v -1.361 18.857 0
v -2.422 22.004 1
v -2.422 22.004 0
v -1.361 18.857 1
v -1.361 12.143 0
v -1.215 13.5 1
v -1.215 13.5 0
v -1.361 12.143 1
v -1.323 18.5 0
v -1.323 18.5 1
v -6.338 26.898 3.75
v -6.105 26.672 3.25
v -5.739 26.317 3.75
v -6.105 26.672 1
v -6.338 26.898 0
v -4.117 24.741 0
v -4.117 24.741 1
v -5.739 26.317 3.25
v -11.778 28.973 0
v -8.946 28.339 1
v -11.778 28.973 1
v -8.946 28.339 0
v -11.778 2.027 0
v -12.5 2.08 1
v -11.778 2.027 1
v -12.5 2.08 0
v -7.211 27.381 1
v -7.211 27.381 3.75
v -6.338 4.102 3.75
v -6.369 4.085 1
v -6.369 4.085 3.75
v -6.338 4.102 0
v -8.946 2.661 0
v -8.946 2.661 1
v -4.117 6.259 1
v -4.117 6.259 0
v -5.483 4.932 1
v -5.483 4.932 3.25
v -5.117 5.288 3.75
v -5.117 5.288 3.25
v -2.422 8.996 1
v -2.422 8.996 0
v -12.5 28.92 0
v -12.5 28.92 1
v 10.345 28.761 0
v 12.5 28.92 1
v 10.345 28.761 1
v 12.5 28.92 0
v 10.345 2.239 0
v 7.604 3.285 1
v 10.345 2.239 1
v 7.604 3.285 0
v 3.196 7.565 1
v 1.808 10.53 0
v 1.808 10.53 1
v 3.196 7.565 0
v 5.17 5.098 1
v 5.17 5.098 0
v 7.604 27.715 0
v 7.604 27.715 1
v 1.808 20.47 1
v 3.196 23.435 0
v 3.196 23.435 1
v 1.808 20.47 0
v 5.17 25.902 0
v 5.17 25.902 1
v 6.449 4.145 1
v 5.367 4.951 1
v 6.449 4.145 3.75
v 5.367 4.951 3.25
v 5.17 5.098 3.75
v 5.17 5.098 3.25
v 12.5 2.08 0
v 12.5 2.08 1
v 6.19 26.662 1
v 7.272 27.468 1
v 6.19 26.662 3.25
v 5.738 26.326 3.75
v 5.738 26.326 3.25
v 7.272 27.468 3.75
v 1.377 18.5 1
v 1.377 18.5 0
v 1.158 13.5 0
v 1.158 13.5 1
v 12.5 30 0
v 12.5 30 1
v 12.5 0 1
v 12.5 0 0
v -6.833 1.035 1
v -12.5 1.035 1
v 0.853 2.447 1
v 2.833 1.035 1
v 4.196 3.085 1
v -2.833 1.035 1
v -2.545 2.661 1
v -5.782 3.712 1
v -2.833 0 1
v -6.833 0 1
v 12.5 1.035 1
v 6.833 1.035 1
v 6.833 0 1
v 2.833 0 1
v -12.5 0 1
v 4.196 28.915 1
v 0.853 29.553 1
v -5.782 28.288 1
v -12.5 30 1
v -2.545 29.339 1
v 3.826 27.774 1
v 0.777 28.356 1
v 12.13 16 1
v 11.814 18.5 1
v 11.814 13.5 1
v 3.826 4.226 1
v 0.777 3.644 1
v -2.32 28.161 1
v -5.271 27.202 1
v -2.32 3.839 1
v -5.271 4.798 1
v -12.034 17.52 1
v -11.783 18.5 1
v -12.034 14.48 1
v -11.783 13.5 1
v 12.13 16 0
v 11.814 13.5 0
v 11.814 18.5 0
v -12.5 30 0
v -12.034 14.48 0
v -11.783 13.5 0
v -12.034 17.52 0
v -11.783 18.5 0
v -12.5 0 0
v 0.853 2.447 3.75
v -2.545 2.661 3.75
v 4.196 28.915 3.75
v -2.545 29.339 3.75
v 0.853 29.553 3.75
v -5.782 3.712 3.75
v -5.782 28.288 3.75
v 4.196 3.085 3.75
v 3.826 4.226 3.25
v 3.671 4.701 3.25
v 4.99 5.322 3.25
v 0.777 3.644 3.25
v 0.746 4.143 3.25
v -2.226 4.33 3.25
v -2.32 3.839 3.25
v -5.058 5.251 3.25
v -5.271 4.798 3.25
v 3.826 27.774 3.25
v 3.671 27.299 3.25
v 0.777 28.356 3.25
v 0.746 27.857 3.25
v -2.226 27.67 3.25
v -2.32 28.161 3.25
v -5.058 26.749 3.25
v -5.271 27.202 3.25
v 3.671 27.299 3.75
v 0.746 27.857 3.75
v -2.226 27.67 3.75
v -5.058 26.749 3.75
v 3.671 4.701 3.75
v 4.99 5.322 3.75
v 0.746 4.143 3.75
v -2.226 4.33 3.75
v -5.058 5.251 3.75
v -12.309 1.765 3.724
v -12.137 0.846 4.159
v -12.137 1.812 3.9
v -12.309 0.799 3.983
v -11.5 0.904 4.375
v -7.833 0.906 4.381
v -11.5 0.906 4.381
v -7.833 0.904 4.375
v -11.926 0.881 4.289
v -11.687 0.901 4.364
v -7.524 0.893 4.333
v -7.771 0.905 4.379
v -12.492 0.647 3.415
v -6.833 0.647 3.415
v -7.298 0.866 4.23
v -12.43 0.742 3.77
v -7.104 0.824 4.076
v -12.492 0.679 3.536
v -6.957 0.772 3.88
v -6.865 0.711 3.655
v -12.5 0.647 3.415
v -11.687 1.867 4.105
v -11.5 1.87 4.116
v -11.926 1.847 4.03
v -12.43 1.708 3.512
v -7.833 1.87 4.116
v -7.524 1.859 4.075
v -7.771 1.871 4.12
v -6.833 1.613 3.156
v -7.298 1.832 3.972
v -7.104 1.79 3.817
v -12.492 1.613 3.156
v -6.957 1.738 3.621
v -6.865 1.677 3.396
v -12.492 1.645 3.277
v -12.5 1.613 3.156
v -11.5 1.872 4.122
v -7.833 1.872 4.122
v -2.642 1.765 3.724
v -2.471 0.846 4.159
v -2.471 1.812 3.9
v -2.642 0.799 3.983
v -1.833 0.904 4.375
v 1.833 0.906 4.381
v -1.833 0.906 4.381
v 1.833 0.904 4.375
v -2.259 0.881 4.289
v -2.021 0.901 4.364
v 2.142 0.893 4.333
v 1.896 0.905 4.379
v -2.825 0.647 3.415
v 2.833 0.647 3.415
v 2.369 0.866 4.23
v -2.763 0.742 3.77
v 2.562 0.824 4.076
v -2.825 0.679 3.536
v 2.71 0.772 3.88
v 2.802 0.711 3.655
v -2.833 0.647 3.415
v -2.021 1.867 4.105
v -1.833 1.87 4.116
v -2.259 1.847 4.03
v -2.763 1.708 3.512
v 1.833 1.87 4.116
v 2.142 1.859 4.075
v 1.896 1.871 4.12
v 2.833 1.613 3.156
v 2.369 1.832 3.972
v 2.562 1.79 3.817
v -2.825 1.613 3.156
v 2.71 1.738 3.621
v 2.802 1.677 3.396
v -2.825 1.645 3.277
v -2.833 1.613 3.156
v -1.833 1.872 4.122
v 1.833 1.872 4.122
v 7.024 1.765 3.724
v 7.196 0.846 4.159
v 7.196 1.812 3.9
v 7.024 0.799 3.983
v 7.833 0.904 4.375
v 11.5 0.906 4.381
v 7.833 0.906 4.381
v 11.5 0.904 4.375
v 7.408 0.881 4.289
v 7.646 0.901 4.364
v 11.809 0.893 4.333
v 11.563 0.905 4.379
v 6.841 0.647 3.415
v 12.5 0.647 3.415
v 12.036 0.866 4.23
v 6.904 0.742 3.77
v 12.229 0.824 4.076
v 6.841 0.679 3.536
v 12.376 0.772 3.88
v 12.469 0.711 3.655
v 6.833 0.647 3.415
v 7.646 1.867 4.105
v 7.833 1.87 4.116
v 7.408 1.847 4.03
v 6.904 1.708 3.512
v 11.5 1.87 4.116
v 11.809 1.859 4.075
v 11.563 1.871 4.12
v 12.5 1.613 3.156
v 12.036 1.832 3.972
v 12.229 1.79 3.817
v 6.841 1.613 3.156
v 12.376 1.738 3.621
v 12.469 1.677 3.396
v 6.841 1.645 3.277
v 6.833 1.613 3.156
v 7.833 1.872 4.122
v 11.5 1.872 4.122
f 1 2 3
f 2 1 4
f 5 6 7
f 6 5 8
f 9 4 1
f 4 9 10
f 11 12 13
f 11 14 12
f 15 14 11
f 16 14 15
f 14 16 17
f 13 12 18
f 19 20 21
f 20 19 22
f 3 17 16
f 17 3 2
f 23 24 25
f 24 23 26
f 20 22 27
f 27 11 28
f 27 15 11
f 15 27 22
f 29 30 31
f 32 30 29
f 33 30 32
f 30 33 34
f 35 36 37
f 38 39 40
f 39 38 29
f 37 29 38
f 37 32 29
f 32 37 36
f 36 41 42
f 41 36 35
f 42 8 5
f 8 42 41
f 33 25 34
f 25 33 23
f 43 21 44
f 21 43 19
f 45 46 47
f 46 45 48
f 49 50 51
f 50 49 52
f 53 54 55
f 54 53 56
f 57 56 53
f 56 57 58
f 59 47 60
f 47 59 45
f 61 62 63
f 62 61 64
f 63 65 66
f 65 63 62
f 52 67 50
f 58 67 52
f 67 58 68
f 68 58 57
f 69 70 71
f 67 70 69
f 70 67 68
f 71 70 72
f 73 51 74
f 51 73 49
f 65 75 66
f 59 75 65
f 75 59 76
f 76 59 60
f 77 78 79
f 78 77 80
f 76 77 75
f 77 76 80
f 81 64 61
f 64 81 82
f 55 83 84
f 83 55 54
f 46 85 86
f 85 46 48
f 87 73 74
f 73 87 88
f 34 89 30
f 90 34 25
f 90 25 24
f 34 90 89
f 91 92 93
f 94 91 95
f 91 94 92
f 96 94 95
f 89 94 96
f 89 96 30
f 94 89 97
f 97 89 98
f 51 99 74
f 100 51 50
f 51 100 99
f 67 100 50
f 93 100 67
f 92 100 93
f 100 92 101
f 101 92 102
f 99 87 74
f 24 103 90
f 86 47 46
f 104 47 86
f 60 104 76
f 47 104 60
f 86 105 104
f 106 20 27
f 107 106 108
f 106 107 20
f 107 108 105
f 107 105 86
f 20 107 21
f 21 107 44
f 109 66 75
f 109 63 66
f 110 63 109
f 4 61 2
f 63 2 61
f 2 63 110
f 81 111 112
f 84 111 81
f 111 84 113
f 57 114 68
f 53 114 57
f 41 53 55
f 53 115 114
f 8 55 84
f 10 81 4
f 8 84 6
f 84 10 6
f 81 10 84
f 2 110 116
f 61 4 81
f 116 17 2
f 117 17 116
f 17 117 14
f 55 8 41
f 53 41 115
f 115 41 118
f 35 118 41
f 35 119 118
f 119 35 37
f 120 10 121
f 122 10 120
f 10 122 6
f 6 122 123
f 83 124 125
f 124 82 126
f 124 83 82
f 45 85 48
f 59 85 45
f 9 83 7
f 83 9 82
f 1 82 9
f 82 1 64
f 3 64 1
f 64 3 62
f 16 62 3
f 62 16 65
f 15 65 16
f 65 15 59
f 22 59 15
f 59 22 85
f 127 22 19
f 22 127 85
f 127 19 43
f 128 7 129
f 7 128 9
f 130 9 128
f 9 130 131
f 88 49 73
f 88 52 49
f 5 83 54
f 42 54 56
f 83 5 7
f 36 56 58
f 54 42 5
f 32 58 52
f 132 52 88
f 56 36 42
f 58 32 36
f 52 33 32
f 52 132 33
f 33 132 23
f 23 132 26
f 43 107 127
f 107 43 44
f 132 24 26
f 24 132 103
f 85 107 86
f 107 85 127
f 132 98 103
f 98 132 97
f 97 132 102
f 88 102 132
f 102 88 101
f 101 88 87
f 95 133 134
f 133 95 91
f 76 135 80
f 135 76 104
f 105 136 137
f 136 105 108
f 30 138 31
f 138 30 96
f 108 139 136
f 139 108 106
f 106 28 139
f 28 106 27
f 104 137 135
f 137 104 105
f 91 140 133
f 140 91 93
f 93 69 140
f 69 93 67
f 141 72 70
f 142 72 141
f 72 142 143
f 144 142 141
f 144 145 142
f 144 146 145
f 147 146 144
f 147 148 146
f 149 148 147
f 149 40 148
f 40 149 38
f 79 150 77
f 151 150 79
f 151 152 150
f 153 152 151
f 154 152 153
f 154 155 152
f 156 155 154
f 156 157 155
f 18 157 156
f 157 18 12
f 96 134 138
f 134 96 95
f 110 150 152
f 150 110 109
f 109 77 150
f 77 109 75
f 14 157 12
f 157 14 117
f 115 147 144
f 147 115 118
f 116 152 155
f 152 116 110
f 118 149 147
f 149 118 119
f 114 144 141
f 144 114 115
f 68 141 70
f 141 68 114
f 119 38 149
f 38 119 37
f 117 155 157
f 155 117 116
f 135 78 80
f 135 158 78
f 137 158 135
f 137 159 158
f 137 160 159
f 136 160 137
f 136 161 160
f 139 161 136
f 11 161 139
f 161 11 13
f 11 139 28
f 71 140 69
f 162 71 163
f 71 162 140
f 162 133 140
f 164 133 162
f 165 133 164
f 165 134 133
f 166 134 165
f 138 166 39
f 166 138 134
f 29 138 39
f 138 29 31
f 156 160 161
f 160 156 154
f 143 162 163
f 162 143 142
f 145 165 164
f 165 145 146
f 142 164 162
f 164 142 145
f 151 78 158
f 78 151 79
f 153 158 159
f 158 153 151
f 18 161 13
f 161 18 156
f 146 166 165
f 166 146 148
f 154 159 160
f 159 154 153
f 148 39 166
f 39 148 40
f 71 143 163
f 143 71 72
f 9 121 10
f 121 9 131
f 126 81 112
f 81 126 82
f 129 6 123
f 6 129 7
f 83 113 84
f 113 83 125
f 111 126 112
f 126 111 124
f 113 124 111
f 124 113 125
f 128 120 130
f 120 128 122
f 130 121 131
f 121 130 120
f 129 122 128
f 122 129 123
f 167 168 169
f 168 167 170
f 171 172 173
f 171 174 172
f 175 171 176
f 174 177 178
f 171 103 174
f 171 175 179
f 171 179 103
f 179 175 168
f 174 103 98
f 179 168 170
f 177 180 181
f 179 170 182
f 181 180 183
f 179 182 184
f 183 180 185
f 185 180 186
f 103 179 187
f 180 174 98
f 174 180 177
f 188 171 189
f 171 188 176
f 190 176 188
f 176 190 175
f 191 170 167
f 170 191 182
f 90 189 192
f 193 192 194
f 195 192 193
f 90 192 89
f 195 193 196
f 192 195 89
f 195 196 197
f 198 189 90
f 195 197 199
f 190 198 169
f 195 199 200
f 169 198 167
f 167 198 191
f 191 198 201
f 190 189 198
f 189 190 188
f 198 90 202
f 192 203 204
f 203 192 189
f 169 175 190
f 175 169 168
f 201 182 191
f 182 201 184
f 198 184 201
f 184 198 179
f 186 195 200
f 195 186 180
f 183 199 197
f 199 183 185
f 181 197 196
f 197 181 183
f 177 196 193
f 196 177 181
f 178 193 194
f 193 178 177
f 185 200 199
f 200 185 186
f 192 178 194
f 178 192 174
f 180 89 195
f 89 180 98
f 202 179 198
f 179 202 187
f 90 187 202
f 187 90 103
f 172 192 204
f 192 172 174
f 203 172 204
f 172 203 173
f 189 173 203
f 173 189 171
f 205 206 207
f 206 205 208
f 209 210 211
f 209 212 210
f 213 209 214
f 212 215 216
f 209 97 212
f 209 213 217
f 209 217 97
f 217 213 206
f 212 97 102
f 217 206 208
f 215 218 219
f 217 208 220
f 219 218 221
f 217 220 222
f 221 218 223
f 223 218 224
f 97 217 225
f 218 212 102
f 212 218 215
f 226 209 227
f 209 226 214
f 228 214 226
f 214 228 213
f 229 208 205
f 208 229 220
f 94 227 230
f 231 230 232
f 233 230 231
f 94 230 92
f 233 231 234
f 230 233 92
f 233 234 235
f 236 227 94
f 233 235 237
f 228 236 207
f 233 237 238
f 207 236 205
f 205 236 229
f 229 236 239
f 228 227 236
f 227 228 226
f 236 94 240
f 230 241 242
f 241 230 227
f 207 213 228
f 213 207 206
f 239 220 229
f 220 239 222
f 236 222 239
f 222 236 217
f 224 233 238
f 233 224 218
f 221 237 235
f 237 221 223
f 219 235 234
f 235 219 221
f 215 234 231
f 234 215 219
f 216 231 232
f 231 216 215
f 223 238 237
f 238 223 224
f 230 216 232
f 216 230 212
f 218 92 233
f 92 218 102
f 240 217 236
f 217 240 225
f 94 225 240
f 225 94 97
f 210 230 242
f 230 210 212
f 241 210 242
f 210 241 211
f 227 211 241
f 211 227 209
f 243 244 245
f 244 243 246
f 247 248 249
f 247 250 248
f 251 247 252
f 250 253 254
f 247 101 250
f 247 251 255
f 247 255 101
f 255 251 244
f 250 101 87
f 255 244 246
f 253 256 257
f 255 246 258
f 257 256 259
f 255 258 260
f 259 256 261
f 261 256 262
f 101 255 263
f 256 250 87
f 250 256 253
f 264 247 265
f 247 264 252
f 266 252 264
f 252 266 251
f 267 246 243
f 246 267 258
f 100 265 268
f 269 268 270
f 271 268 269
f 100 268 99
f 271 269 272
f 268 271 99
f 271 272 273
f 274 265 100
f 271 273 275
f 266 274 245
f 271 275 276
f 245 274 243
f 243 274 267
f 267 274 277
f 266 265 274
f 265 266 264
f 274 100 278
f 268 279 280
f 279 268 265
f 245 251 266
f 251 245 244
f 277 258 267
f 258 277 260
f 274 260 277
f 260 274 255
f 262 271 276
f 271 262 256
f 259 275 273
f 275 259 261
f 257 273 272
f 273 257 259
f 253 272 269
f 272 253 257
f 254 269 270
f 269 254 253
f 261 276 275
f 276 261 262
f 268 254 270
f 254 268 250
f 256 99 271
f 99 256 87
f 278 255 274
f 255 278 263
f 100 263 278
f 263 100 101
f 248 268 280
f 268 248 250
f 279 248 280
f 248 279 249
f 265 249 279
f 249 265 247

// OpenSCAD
/*
 * Frameless Photo Stand, v2.0
 *
 * by Alex Franke (CodeCreations), Jun 2012
 * http://www.theFrankes.com
 * 
 * Licenced under Creative Commons Attribution - Non-Commercial - Share Alike 3.0 
 * 
 * DESCRIPTION: This is a simple parametric frameless photo stand that uses (with its 
 *   default values) only about 50mm of filament (about a penny) and holds up a photo
 *   for display without the use of a frame. 
 * 
 * INSTRUCTIONS: Choose some values in the "User-defined values" section, render,
 *   and print. If you want to render the object with a slot to hold a coin, use 
 *   the name of that coin from the list in "Some constant coin sizes," or define 
 *   your own size as [diameter,thickness]. For example, if you want to stack two 
 *   1-euro coins, use [23.25, 4.66] as the value. Be sure the base is sized to fit
 *   the coins. 
 * 
 * v1.0, Jun 9, 2012: Initial Release.
 * v2.0, Jun 19, 2012: Adds coin clip for added weight.
 * 
 * TODO: 
 *   * nothing yet...  
 */

/////////////////////////////////////////////////////////////////////////////
// Some constant coin sizes... 
/////////////////////////////////////////////////////////////////////////////

NONE   = [0,0];          EU_2E  = [25.75,2.2];    CA_2D  = [28,1.8];
                         EU_1E  = [23.25,2.33];   CA_1D  = [26.5,1.75];
US_1D  = [26.49,2];      EU_50C = [24.25,2.38];   CA_50C = [23.87,1.95];
US_50C = [30.61,2.15];   EU_20C = [22.25,2.14];   CA_25C = [23.88,1.58];
US_25C = [24.26,1.75];   EU_10C = [19.75,1.93];   CA_10C = [18.03,1.22];
US_10C = [17.91,1.35];   EU_5C  = [21.25,1.67];   CA_5C  = [21.2,1.76];
US_5C  = [21.21,1.95];   EU_2C  = [18.75,1.67];   CA_1C  = [19.05,1.45];
US_1C  = [19.05,1.55];   EU_1C  = [16.3,1.67];

AU_2D  = [20.5,3.2];
AU_1D  = [25,3];
AU_50C = [31.51,2];
AU_20C = [28.52,2.5];
AU_10C = [23.6,2];
AU_5C  = [19.41,1.3];


/////////////////////////////////////////////////////////////////////////////
// User-defined values... 
/////////////////////////////////////////////////////////////////////////////

baseThickness     = 1;          // The thickness of the base
baseWidth         = 25;         // The width of the base 
baseLength        = 30;         // The length of the base
coinSize          = US_25C;     // The coin to use, or [diameter,thickness]
coinClipPadding   = 0.5;        // The extra space built into to the coin clip
coinClipThickness = 1.2;        // The thickness of the coin slot 
coinSupportWidth  = 5;          // The width of the coin support surface
coinStopHeight    = 0.5;        // The width of the coin support surface
coinStopOverhang  = 0.5;        // The width of the coin support surface

baseSupportWidth  = 2;          // The minimal width of the support structure 

tabThickness      = 1.0;        // The thickness of each vertical "tab"
tabHeight         = 3.5;        // The height of the vertical tabs
tabRadius         = 1;          // The radius of the top corners of the tabs
tabSeparation     = 4;          // How far apart the tabs are 
tabAngle          = 75;         // The angle of the tabs (90 is vertical) 

$fn               = 25;         // Quality of circles 


/////////////////////////////////////////////////////////////////////////////
// Calculated values... 
/////////////////////////////////////////////////////////////////////////////

tabWidth = (baseWidth-(tabSeparation*2))/3;
sideCutoutWidth = (baseWidth-baseSupportWidth)/2;
sideCutoutLength = (baseLength-tabThickness-baseSupportWidth);


/////////////////////////////////////////////////////////////////////////////
// The code... 
/////////////////////////////////////////////////////////////////////////////

union() {

	// Base
	Base(baseLength, baseWidth, baseThickness, tabThickness, sideCutoutLength, sideCutoutWidth );
	
	// Coin clip 
	if ( coinSize[0] * coinSize[1] > 0 ) {
		translate([0,0,baseThickness])
		intersection() {
			translate([0,baseLength/2 + tabThickness,0])
			difference() {
				union() {
					difference() {
						// outer circle 
						cylinder(r=coinSize[0]/2 + coinClipPadding/2 + coinClipThickness, 
							h=coinSize[1] + coinClipPadding); 
						// inner circle cutout
						translate([0,0,-0.5]) 
							cylinder(r=coinSize[0]/2 + coinClipPadding/2, 
								h=coinSize[1] + coinClipPadding + 1); 
					}

					// coin stop 
					translate([0,0,coinSize[1]+coinClipPadding])
					difference() {
						// outer circle
						cylinder(r=coinSize[0]/2 + coinClipPadding/2 + coinClipThickness, h=coinStopHeight); 
						// inner circle cutout
						translate([0,0,-0.5]) 
							cylinder(r=coinSize[0]/2 + coinClipPadding/2 - coinStopOverhang, h=coinStopHeight+1); 
					}
				}

			}
			translate([0,0,-0.5]) 
				Base(baseLength, baseWidth, coinSize[1]+coinStopHeight+coinClipPadding+1, tabThickness, 
					sideCutoutLength, sideCutoutWidth );
		}

		// Coin support
		translate([0,baseLength/2 + tabThickness,baseThickness/2])
		intersection() {
			cube([coinSize[0],coinSupportWidth,baseThickness], center=true);
			cylinder(r=coinSize[0]/2, h=coinSize[1], center=true); 
		}
	}

	// Tabs
	translate([0,0,baseThickness]) 
		rotate([tabAngle-90,0,0]) 
			for( i=[-1,0,1] )
				translate([i*(baseWidth-tabWidth)/2,tabThickness/2,tabHeight/2]) 
					RoundedTab([tabWidth,tabThickness, tabHeight], tabRadius);
}


/////////////////////////////////////////////////////////////////////////////
// Modules... 
/////////////////////////////////////////////////////////////////////////////

module Base(length, width, thickness, tabThickness, cutoutLength, cutoutWidth ) {
	difference() {
		translate([0,length/2,thickness/2]) 
			cube([width, length, thickness], center = true);

		// Curved cutouts 
		for( i=[-1,1] ) {
			translate([i*width/2,tabThickness+((length-tabThickness)/2),-0.5]) 
				scale([1,cutoutLength/cutoutWidth/2,1]) 
					cylinder(h=thickness+1, r=cutoutWidth);
		}
	}
}

module RoundedTab( size, radius ) {
	union() {
		for( i=[-1,1] ){
			translate([i*((size[0]/2)-radius), 0, (size[2]/2)-radius]) 
				rotate([90,0,0]) 
					cylinder( h=size[1], r=radius, center=true ) ;
		}
		translate([0,0,-radius/2]) 
			cube([size[0], size[1], size[2]-radius], center=true);
		translate([0,0,0]) 
			cube([size[0]-radius*2, size[1], size[2]], center=true);
	}
}

